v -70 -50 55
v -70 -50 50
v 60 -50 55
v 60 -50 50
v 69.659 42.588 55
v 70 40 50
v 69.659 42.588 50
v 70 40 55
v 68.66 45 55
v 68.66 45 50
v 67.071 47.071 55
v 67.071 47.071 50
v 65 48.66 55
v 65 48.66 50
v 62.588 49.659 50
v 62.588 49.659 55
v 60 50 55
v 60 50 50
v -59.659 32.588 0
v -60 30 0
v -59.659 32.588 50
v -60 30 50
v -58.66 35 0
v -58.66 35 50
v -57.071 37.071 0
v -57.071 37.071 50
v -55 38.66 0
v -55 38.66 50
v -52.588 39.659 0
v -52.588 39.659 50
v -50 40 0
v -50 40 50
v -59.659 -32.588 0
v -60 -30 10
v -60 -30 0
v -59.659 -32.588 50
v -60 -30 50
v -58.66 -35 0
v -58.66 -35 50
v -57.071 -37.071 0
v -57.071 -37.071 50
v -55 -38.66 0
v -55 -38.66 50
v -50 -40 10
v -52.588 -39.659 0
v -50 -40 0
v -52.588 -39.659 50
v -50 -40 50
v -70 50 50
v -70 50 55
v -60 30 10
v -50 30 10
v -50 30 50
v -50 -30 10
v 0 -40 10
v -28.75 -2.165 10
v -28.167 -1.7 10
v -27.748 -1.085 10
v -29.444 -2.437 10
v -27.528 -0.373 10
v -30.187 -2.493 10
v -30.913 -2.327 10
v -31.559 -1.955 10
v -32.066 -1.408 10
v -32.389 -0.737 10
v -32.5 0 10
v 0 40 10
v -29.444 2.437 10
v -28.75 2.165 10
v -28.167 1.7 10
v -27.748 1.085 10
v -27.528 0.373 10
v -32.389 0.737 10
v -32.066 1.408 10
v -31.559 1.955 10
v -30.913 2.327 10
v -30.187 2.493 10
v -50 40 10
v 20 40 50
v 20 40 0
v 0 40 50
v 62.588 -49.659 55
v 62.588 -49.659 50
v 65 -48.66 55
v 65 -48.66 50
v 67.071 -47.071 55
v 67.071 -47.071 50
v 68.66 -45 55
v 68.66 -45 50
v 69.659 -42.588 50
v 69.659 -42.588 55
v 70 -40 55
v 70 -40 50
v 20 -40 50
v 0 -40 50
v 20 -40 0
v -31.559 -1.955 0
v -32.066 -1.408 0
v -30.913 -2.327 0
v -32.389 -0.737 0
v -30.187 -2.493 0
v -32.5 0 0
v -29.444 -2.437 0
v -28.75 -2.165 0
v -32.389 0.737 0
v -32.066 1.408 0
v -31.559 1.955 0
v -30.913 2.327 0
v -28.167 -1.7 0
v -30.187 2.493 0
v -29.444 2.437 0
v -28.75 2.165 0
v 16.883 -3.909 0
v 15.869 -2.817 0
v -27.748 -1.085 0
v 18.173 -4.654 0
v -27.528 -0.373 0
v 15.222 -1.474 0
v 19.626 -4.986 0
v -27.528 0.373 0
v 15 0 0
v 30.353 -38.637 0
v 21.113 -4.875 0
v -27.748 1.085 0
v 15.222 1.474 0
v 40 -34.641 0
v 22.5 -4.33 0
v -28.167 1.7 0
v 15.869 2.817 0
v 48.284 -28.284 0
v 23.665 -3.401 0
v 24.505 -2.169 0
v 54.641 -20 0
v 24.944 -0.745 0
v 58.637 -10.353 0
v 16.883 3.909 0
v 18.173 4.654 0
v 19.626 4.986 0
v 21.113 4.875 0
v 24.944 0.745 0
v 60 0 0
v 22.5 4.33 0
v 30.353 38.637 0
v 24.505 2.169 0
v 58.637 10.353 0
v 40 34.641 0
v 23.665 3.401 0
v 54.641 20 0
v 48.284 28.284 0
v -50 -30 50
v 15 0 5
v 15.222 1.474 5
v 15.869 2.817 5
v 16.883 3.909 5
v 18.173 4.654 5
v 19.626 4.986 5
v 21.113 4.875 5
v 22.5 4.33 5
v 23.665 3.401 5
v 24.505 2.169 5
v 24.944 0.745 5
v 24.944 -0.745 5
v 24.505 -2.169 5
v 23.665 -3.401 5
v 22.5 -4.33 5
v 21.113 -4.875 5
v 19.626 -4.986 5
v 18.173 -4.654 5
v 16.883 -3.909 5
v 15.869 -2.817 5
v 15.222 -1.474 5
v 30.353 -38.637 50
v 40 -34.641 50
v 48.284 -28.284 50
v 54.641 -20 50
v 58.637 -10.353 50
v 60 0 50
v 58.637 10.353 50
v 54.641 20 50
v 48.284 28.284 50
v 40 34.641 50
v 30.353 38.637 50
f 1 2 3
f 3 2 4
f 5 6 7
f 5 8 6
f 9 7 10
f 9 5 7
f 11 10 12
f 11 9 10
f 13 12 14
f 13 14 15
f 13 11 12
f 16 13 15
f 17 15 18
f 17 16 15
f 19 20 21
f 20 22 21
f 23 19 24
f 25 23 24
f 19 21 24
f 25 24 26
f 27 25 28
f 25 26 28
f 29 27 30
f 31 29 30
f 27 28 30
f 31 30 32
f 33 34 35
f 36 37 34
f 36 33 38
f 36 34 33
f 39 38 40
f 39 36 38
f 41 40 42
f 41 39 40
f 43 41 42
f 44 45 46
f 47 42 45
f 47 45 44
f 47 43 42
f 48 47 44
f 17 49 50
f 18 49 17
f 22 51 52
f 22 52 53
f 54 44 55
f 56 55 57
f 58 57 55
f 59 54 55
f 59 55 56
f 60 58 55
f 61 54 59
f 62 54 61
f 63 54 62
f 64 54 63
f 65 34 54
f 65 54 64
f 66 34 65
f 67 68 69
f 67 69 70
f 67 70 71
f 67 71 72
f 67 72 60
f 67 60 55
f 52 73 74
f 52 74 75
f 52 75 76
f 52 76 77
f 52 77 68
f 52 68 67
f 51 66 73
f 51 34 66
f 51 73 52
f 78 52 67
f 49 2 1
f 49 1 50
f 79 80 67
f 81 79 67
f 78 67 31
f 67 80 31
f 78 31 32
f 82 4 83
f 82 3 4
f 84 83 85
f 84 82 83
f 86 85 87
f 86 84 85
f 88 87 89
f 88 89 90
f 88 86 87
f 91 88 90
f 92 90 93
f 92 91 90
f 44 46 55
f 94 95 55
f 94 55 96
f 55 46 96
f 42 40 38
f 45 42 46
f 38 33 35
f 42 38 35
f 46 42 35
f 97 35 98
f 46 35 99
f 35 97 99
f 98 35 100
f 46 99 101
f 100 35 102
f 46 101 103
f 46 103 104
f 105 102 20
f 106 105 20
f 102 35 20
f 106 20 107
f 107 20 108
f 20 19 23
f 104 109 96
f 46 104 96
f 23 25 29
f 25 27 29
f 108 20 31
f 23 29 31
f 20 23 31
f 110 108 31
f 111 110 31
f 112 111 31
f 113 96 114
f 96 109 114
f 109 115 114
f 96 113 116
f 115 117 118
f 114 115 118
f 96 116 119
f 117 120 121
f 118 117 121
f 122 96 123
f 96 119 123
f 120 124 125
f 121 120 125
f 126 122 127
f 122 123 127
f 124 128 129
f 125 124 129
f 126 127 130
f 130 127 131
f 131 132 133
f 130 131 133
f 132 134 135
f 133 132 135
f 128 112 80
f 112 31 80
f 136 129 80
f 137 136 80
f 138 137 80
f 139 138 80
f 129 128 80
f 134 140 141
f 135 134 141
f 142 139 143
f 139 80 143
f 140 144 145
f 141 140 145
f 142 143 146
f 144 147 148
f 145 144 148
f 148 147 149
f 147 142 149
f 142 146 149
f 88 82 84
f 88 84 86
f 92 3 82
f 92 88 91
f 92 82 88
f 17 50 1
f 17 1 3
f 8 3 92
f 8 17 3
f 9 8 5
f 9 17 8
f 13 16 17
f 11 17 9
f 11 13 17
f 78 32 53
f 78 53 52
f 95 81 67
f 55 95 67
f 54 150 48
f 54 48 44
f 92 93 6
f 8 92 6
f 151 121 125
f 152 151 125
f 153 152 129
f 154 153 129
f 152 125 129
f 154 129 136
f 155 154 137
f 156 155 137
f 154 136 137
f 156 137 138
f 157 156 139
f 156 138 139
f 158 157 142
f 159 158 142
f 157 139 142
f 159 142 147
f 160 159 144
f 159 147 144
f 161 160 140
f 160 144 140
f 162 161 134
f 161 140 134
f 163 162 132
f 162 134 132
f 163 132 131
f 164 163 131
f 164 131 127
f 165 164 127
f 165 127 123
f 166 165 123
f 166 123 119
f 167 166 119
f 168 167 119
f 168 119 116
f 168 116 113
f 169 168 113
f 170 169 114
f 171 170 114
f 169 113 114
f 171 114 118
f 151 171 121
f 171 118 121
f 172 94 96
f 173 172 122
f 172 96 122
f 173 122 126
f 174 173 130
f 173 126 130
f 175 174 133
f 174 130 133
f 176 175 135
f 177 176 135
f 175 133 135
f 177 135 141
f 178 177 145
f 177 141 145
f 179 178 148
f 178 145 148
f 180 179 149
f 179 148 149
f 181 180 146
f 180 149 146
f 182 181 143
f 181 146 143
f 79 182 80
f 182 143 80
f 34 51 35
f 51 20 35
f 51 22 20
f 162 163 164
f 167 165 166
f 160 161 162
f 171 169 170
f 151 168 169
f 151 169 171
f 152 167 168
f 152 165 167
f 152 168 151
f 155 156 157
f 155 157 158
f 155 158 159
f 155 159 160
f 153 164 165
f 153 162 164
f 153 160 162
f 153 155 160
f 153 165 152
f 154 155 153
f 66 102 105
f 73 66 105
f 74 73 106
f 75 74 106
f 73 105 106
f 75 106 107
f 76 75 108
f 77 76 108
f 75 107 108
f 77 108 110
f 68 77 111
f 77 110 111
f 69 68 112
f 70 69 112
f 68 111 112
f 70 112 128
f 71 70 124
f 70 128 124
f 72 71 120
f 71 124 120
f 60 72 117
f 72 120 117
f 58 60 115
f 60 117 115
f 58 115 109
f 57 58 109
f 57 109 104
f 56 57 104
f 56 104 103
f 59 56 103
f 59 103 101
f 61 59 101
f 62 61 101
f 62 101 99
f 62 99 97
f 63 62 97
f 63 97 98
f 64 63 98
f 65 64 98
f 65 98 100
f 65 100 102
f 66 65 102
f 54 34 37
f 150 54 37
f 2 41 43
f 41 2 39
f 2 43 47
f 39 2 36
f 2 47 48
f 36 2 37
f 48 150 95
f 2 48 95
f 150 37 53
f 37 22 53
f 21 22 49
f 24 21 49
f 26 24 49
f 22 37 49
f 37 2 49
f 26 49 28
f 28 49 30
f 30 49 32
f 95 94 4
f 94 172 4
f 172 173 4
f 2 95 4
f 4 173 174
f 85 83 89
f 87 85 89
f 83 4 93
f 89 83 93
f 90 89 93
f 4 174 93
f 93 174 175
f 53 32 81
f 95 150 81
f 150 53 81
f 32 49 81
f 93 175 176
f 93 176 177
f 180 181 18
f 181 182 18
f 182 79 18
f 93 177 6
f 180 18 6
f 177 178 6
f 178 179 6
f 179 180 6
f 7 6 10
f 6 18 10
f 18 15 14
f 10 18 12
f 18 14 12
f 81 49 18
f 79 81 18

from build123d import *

# Parameters (mm, degrees)
SALIENTE_EXTRUIR2_DEPTH = 50
CROQUIS4_W              = 140
CROQUIS4_H              = 100
SALIENTE_EXTRUIR3_DEPTH = 5
CROQUIS5_R              = 5
CORTAR_EXTRUIR1_DEPTH   = 5
CROQUIS6_W              = 50
CROQUIS6_H              = 40
CORTAR_EXTRUIR2_DEPTH   = 80
CROQUIS7_W              = 40
CROQUIS7_H              = 60
CORTAR_EXTRUIR3_DEPTH   = 50
CROQUIS8_R              = 2.5
CORTAR_EXTRUIR5_DEPTH   = 20
REDONDEO1_R             = 10
REDONDEO2_R             = 10
REDONDEO3_R             = 10
REDONDEO4_R             = 10


with BuildPart() as part:
    # Croquis1 → Saliente-Extruir2 (new body)
    with BuildSketch(Plane.XY):
        with BuildLine():
            Line((-60, 40), (-60, -40))
            Line((-60, -40), (20.000000086, -40))
            ThreePointArc((20.000000086, -40), (60, 8.6e-08), (19.999999914, 40))
            Line((19.999999914, 40), (-60, 40))
        make_face()
    extrude(amount=SALIENTE_EXTRUIR2_DEPTH)

    # Croquis4 → Saliente-Extruir3 (add)
    with BuildSketch(Plane.XY.offset(50)):
        Rectangle(CROQUIS4_W, CROQUIS4_H)
    extrude(amount=SALIENTE_EXTRUIR3_DEPTH)

    # Croquis5 → Cortar-Extruir1 (cut)
    with BuildSketch(Plane(origin=(0, 0, 0), x_dir=(-1, 0, 0), z_dir=(0, 0, -1))):
        with Locations((-20, 0)):
            Circle(CROQUIS5_R)
    extrude(amount=-CORTAR_EXTRUIR1_DEPTH, mode=Mode.SUBTRACT)

    # Croquis6 → Cortar-Extruir2 (cut)
    with BuildSketch(Plane(origin=(0, 40, 0), x_dir=(1, 0, 0), z_dir=(0, 1, 0))):
        with Locations((-25, -30)):
            Rectangle(CROQUIS6_W, CROQUIS6_H)
    extrude(amount=-CORTAR_EXTRUIR2_DEPTH, mode=Mode.SUBTRACT)

    # Croquis7 → Cortar-Extruir3 (cut)
    with BuildSketch(Plane.ZY.offset(60)):
        with Locations((30, 0)):
            Rectangle(CROQUIS7_W, CROQUIS7_H)
    extrude(amount=-CORTAR_EXTRUIR3_DEPTH, mode=Mode.SUBTRACT)

    # Croquis8 → Cortar-Extruir5 (cut)
    with BuildSketch(Plane(origin=(0, 0, 0), x_dir=(-1, 0, 0), z_dir=(0, 0, -1))):
        with Locations((30, 0)):
            Circle(CROQUIS8_R)
    extrude(amount=-CORTAR_EXTRUIR5_DEPTH, mode=Mode.SUBTRACT)

    # Redondeo1
    redondeo1_edges = [part.edges().sort_by_distance(p)[0] for p in [
        (70, -50, 52.5),
    ]]
    fillet(redondeo1_edges, radius=REDONDEO1_R)

    # Redondeo2
    redondeo2_edges = [part.edges().sort_by_distance(p)[0] for p in [
        (70, 50, 52.5),
    ]]
    fillet(redondeo2_edges, radius=REDONDEO2_R)

    # Redondeo3
    redondeo3_edges = [part.edges().sort_by_distance(p)[0] for p in [
        (-60, -40, 25),
    ]]
    fillet(redondeo3_edges, radius=REDONDEO3_R)

    # Redondeo4
    redondeo4_edges = [part.edges().sort_by_distance(p)[0] for p in [
        (-60, 40, 25),
    ]]
    fillet(redondeo4_edges, radius=REDONDEO4_R - 0.0001)  # a hair under: the kernel refuses the full size


solid = part.part
